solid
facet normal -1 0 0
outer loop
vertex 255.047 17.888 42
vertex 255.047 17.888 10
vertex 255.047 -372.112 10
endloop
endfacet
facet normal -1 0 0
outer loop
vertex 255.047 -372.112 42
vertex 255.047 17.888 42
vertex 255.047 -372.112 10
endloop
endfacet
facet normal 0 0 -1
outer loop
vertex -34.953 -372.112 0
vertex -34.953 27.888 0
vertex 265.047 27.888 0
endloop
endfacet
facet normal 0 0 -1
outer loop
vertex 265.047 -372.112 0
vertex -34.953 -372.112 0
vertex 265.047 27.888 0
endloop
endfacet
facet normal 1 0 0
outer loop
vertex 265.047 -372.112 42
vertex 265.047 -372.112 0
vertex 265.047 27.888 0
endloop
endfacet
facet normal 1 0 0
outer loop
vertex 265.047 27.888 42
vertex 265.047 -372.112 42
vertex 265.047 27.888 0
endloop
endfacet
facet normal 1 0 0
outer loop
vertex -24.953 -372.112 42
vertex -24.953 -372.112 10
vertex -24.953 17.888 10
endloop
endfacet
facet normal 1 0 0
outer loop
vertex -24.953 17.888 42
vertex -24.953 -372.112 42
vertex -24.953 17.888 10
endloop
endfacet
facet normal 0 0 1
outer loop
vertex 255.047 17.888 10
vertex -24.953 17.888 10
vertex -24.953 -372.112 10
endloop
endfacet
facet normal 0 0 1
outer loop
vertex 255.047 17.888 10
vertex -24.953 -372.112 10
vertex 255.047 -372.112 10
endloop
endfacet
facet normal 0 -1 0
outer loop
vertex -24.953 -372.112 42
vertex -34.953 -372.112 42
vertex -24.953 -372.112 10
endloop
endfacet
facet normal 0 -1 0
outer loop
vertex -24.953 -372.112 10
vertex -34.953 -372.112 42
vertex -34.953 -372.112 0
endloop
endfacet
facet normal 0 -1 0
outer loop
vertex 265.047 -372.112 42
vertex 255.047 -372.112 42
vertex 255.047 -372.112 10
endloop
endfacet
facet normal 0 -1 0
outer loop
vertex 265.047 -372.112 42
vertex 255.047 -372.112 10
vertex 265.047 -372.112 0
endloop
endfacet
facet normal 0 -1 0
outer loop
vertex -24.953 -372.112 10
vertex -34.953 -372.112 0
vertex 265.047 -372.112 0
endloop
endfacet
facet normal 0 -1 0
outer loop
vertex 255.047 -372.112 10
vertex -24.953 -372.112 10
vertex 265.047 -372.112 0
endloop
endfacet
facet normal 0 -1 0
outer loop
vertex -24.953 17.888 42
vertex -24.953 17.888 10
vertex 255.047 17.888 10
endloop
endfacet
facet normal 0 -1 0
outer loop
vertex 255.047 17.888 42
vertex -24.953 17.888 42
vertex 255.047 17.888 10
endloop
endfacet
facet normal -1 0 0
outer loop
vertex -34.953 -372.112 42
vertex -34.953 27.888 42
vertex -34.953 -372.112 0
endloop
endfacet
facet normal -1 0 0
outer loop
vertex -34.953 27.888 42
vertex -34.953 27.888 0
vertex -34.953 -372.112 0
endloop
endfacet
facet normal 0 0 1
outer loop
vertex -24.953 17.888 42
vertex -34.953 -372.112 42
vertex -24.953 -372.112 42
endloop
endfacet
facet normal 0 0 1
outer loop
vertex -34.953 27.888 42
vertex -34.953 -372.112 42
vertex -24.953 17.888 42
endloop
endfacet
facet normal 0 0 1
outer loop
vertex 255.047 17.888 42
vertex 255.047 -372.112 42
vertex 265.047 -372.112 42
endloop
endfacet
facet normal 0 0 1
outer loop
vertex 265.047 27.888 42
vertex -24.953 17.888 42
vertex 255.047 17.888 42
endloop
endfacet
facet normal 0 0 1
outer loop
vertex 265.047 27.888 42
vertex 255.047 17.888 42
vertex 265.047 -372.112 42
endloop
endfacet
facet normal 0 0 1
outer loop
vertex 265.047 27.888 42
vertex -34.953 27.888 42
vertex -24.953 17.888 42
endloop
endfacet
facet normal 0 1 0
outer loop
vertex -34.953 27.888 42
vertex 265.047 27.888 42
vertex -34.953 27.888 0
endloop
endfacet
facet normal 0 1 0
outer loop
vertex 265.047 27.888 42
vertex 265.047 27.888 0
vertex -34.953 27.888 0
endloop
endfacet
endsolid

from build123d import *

# Parameters (mm, degrees)
SKETCH_1_W      = 300
SKETCH_1_H      = 400
EXTRUDE_1_DEPTH = 10
EXTRUDE_2_DEPTH = 32


with BuildPart() as part:
    # 草图1 → 凸台-拉伸1 (new body)
    with BuildSketch(Plane.XY):
        with Locations((115.046975242, -172.111948332)):
            Rectangle(SKETCH_1_W, SKETCH_1_H)
    extrude(amount=EXTRUDE_1_DEPTH)

    # 草图2 → 凸台-拉伸2 (add)
    with BuildSketch(Plane.XY.offset(10)):
        Polygon((265.046975242, -372.111948332), (265.046975242, 27.888051668), (-34.953024758, 27.888051668), (-34.953024758, -372.111948332), (-24.953024758, -372.111948332), (-24.953024758, 17.888051668), (255.046975242, 17.888051668), (255.046975242, -372.111948332), align=None)
    extrude(amount=EXTRUDE_2_DEPTH)


solid = part.part
